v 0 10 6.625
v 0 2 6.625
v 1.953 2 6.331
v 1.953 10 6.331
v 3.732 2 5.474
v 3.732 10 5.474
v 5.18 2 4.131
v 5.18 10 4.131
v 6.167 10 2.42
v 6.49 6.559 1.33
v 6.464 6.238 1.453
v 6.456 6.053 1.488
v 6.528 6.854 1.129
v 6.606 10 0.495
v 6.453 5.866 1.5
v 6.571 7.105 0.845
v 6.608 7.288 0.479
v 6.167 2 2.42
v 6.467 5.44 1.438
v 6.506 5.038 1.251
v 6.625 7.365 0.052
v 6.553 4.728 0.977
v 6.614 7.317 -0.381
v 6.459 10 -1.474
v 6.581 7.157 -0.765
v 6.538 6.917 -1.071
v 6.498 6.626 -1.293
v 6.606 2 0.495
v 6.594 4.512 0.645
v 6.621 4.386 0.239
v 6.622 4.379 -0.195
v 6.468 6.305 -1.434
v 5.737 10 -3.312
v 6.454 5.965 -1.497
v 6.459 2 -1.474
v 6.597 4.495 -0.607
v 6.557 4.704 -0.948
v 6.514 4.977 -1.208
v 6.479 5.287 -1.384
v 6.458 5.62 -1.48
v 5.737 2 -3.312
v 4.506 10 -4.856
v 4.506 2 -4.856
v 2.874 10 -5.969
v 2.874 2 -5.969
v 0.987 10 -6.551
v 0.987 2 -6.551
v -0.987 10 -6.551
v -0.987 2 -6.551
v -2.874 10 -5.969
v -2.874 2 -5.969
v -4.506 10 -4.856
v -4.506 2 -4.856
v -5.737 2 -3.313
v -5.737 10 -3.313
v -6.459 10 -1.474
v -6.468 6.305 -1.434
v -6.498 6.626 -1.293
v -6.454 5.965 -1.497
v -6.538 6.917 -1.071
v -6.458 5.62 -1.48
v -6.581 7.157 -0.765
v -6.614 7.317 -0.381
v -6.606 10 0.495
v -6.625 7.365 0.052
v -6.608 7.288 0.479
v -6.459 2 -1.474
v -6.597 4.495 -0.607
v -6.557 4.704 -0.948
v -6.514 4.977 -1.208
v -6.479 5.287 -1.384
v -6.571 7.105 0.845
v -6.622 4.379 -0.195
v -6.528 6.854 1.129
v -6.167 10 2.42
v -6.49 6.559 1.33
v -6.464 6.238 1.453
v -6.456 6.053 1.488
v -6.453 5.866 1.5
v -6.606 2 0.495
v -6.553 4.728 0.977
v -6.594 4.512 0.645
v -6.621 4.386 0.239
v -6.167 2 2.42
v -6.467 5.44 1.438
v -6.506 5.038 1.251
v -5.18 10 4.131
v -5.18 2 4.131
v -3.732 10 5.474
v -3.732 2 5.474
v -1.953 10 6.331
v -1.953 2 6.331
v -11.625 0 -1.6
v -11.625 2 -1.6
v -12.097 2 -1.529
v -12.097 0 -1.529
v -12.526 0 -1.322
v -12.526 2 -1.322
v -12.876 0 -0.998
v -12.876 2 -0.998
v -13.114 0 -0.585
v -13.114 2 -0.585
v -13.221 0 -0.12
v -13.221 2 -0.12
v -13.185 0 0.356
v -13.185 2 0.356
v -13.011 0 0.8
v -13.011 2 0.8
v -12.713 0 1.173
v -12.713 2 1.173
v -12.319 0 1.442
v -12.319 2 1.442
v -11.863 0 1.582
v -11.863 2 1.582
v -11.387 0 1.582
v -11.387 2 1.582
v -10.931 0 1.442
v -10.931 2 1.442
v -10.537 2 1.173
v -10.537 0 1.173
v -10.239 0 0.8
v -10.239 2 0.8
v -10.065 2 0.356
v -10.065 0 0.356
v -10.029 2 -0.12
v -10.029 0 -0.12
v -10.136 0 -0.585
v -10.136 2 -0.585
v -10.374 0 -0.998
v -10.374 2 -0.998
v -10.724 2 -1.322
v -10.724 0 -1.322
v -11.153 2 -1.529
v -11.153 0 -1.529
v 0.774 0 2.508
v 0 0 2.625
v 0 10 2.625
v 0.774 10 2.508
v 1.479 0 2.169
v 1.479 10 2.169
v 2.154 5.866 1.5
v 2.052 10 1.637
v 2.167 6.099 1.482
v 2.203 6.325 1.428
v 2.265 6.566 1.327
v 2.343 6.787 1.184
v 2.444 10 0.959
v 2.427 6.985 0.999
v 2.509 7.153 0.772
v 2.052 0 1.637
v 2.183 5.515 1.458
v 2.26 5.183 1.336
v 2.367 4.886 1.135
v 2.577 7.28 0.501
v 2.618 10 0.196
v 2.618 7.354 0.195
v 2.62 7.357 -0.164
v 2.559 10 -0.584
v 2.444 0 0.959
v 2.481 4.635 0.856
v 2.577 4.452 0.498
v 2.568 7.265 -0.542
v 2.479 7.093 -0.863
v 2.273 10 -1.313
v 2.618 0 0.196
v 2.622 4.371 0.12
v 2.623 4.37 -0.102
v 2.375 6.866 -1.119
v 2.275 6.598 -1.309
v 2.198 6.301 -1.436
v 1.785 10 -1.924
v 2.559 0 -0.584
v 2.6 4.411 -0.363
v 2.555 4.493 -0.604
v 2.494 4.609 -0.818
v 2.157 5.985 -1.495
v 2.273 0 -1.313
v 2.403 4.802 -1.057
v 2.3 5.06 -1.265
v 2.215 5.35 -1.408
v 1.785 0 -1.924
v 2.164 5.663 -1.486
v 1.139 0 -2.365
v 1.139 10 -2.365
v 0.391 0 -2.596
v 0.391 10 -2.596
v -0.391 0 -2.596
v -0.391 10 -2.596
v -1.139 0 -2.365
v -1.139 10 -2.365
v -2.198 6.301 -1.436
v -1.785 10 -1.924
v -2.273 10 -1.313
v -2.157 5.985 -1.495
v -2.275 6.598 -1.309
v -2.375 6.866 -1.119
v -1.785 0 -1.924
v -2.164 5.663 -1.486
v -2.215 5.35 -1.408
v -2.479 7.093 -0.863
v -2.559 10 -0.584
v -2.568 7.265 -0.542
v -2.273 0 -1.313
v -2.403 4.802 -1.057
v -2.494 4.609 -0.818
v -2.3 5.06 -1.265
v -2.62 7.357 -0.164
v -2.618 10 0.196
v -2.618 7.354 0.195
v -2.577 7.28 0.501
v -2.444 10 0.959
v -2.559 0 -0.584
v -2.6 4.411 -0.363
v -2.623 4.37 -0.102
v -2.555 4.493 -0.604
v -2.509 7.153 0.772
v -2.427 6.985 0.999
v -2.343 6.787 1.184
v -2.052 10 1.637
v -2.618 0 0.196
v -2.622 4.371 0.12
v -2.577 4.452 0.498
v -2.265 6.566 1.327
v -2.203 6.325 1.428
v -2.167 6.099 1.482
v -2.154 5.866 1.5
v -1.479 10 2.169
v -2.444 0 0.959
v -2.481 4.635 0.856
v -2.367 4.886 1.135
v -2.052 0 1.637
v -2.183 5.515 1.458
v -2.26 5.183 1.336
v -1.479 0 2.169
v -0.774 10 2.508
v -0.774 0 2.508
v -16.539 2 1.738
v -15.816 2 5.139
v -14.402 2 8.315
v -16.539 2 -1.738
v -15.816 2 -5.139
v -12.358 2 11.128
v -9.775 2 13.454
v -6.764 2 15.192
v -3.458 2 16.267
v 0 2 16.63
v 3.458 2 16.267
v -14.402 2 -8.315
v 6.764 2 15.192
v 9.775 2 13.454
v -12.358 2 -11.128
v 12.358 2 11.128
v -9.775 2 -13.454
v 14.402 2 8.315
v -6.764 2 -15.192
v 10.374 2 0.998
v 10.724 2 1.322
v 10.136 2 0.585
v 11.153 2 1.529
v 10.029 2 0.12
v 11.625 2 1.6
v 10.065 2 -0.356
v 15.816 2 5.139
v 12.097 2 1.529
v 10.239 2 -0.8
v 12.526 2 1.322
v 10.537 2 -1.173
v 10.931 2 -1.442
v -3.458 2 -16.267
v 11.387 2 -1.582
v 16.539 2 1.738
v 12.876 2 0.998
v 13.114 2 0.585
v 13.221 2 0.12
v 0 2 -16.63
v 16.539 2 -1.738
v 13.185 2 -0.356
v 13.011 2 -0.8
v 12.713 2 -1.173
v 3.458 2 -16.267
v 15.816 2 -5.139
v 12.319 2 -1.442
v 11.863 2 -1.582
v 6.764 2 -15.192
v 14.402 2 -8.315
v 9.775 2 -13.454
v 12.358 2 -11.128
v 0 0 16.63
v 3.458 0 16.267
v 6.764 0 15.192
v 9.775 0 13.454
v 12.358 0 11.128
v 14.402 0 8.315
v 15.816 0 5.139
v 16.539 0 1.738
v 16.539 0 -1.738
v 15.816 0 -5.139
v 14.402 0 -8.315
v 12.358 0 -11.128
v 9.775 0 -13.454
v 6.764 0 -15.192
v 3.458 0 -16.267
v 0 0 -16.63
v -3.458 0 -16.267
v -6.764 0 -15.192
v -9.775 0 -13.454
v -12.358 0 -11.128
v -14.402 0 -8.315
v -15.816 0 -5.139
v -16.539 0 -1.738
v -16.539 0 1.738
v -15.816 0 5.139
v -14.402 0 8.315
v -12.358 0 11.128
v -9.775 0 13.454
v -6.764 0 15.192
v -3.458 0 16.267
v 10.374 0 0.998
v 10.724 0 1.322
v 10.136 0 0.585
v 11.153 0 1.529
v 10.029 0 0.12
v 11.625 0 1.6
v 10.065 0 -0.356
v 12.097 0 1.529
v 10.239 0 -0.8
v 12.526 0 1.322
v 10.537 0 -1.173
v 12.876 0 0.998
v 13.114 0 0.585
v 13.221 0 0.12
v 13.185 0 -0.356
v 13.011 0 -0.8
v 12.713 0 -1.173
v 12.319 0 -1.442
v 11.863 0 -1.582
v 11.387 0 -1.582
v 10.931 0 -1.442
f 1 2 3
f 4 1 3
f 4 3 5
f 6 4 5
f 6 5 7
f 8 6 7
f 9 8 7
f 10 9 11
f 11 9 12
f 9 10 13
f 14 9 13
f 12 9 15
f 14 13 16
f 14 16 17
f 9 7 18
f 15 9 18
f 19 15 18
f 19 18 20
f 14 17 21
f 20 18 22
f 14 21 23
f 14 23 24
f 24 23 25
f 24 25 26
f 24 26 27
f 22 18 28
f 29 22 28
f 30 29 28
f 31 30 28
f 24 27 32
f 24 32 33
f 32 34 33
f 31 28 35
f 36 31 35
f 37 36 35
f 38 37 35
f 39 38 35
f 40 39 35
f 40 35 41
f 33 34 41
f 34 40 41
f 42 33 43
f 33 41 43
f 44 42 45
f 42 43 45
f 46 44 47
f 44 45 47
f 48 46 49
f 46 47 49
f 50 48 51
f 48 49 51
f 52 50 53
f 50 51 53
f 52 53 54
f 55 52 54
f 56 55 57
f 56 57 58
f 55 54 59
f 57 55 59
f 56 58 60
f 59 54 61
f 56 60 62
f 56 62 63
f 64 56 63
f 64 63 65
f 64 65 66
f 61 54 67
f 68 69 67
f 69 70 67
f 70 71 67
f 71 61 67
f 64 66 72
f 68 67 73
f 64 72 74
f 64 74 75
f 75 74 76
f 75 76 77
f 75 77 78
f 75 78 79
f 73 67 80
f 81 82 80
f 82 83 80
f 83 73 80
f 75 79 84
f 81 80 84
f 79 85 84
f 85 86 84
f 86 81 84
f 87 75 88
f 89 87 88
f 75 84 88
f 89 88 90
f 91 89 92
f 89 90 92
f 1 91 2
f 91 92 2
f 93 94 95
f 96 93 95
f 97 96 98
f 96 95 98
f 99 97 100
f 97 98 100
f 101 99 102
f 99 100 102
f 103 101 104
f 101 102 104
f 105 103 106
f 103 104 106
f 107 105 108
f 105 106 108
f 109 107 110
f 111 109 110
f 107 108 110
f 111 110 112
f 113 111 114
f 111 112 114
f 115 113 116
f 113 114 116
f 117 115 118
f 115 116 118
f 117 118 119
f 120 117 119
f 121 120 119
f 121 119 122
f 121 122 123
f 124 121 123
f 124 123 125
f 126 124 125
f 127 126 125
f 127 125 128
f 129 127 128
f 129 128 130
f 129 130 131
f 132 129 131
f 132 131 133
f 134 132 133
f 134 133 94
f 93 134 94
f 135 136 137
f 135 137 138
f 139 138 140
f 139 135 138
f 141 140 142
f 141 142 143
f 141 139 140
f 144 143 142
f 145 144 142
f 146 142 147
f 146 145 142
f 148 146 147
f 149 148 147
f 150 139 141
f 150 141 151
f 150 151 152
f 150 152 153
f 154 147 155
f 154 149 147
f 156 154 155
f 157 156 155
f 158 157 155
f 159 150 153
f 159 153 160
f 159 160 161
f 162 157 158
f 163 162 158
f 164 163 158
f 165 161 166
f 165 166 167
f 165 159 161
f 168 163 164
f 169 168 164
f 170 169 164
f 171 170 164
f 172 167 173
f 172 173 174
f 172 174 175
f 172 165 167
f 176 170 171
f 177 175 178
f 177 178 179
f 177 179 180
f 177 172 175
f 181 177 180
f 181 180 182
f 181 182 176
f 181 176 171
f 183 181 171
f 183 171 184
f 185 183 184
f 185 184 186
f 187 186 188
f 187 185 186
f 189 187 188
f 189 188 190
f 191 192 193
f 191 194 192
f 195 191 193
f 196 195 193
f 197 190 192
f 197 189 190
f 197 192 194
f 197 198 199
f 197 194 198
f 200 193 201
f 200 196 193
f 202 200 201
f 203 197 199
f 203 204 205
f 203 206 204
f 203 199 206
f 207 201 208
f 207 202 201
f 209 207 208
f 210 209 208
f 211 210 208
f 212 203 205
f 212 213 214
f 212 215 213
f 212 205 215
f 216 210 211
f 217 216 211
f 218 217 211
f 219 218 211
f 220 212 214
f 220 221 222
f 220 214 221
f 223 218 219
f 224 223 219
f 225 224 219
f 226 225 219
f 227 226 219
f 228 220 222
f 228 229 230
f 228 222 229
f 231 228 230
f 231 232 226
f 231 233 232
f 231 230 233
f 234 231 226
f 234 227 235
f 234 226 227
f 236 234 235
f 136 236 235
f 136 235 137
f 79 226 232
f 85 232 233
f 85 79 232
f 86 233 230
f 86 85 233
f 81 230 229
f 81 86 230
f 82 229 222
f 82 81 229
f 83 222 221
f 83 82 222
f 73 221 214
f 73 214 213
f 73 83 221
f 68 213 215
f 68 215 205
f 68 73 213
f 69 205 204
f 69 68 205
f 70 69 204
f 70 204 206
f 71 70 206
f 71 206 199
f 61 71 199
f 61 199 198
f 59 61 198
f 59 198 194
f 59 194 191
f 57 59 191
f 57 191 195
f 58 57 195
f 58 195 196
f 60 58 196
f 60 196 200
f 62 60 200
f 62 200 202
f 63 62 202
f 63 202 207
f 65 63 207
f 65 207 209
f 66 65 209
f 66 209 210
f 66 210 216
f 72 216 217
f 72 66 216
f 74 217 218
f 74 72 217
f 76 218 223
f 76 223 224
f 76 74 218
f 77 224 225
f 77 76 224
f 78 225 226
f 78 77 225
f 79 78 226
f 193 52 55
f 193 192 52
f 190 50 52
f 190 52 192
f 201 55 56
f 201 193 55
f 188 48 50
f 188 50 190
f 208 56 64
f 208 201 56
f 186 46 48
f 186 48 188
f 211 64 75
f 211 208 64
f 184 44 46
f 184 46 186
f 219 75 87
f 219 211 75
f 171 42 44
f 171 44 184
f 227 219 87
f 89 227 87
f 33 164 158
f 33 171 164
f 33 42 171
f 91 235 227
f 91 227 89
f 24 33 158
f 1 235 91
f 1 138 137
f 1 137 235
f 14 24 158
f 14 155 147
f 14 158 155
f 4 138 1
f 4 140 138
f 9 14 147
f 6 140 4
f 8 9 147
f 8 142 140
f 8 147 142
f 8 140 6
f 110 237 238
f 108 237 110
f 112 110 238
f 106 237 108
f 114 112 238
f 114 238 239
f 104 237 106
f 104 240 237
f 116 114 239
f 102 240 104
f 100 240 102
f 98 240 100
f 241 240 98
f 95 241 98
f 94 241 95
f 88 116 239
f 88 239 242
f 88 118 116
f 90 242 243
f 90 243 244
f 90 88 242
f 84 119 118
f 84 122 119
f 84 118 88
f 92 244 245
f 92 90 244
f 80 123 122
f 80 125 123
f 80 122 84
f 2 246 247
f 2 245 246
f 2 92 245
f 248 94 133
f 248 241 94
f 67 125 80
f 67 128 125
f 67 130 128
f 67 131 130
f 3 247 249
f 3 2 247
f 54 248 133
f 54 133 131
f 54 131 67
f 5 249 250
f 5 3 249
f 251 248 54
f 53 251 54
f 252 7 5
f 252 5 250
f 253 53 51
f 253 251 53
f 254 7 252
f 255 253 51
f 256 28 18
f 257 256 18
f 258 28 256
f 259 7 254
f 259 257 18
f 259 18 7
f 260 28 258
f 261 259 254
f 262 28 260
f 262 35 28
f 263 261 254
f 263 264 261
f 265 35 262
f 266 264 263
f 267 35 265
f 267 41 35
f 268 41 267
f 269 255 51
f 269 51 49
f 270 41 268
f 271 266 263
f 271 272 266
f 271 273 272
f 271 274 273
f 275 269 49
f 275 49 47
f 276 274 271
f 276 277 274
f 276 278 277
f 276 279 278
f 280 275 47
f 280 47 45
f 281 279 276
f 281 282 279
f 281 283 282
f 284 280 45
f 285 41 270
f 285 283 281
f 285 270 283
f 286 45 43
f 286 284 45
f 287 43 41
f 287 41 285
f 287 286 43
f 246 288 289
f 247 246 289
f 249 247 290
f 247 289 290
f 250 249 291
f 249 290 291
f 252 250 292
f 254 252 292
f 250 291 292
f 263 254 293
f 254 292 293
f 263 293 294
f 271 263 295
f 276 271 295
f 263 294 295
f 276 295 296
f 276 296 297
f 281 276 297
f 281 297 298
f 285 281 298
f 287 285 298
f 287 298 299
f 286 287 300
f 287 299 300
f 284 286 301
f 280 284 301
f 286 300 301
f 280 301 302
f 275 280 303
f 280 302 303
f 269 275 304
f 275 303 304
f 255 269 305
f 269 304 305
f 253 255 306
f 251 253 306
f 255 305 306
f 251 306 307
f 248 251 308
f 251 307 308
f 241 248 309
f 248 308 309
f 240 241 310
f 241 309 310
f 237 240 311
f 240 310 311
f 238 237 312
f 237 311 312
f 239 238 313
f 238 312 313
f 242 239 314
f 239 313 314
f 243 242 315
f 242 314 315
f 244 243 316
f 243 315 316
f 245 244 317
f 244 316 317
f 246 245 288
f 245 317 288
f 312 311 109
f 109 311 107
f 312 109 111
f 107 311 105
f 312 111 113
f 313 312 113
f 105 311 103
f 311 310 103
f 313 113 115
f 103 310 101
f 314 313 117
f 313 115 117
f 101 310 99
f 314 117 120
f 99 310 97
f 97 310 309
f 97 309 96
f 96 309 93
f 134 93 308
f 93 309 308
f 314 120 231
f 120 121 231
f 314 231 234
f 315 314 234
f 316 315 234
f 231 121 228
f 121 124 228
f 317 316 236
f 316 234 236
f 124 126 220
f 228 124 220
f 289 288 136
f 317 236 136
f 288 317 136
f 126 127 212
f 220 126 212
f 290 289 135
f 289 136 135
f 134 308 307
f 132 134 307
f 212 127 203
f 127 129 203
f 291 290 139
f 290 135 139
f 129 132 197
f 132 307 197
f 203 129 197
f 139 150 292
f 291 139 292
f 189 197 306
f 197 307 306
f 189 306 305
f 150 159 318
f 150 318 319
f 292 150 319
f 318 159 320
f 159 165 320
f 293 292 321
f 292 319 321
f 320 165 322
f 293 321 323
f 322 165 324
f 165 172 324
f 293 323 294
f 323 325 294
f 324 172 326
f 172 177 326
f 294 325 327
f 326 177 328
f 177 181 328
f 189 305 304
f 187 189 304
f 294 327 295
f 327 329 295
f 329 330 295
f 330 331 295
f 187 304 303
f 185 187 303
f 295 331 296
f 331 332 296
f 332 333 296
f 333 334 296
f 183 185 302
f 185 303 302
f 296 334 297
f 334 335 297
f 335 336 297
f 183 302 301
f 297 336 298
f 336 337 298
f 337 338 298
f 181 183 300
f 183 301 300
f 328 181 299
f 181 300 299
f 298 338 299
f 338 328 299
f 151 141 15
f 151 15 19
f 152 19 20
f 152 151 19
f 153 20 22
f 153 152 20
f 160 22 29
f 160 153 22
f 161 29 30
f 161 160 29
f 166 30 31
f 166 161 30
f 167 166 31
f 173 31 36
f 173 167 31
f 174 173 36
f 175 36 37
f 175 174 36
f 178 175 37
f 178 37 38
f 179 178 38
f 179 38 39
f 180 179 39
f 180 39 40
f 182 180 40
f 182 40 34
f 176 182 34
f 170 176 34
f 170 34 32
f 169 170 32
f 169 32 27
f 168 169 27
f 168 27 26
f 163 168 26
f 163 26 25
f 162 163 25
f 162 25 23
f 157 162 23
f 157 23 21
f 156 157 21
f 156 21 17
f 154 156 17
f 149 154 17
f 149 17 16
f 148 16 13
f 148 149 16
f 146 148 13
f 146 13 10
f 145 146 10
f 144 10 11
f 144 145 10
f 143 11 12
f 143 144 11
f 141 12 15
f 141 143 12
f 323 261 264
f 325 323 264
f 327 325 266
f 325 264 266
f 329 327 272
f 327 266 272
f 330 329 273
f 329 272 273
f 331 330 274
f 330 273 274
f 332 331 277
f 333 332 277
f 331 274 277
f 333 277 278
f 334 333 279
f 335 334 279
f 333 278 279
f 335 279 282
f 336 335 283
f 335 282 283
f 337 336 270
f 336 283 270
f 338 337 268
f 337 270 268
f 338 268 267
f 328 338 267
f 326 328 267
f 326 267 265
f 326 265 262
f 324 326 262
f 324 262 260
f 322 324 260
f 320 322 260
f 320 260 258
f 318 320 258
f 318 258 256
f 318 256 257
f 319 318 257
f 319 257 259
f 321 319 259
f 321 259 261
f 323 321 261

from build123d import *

# Parameters (mm, degrees)
SKETCH1_R               = 16.63
SKETCH1_R_2             = 4.8
SKETCH1_R_3             = 2.625
BOSS_EXTRUDE2_DEPTH     = 2
SKETCH5_R               = 6.625
SKETCH5_R_2             = 2.625
BOSS_EXTRUDE3_DEPTH     = 8
SKETCH4_R               = 1.6
CUT_EXTRUDE1_DEPTH      = 8
CIRPATTERN1_COUNT       = 2
CUT_EXTRUDE2_DEPTH      = 10
CUT_EXTRUDE2_DEPTH_BACK = 8
SKETCH6_R               = 1.5


with BuildPart() as part:
    # Sketch1 → Boss-Extrude2 (new body)
    # profile 1 of 2: a face of its own
    with BuildSketch(Plane(origin=(0, 0, 0), x_dir=(1, 0, 0), z_dir=(0, 1, 0))):
        with Locations(Location((0, 0, 0), (0, 0, 270))):
            Circle(SKETCH1_R)
        Circle(SKETCH1_R_2, mode=Mode.SUBTRACT)
    # profile 2 of 2: a face of its own
    with BuildSketch(Plane(origin=(0, 0, 0), x_dir=(1, 0, 0), z_dir=(0, 1, 0))):
        Circle(SKETCH1_R_2)
        with Locations(Location((0, 0, 0), (0, 0, 270))):
            Circle(SKETCH1_R_3, mode=Mode.SUBTRACT)
    extrude(amount=BOSS_EXTRUDE2_DEPTH)

    # Sketch5 → Boss-Extrude3 (add)
    with BuildSketch(Plane(origin=(0, 2, 0), x_dir=(1, 0, 0), z_dir=(0, 1, 0))):
        with Locations(Location((0, 0, 0), (0, 0, 270))):
            Circle(SKETCH5_R)
        with Locations(Location((0, 0, 0), (0, 0, 270))):
            Circle(SKETCH5_R_2, mode=Mode.SUBTRACT)
    extrude(amount=BOSS_EXTRUDE3_DEPTH)

    # Sketch4 → Cut-Extrude1 (cut)
    with BuildSketch(Plane(origin=(0, 2, 0), x_dir=(1, 0, 0), z_dir=(0, 1, 0))):
        with Locations(Location((11.625, 0, 0), (0, 0, 270))):
            Circle(SKETCH4_R)
    cut_extrude1 = extrude(amount=-CUT_EXTRUDE1_DEPTH, mode=Mode.SUBTRACT)

    # CirPattern1: Cut-Extrude1 ×2 about axis
    cirpattern1_axis = Axis((0, 0, 0), (0, 1, 0))
    for i in range(1, CIRPATTERN1_COUNT):
        add(cut_extrude1.rotate(cirpattern1_axis, i * 360 / CIRPATTERN1_COUNT), mode=Mode.SUBTRACT)

    # Sketch6 → Cut-Extrude2 (cut, two sides: drawn at the far end of the back side and taken through both)
    with BuildSketch(Plane(origin=(0, 0, 0), x_dir=(0, 0, -1), z_dir=(1, 0, 0)).offset(-CUT_EXTRUDE2_DEPTH_BACK)):
        with Locations(Location((0, 5.866356901, 0), (0, 0, 180))):
            Circle(SKETCH6_R)
    extrude(amount=CUT_EXTRUDE2_DEPTH + CUT_EXTRUDE2_DEPTH_BACK, mode=Mode.SUBTRACT)


solid = part.part
